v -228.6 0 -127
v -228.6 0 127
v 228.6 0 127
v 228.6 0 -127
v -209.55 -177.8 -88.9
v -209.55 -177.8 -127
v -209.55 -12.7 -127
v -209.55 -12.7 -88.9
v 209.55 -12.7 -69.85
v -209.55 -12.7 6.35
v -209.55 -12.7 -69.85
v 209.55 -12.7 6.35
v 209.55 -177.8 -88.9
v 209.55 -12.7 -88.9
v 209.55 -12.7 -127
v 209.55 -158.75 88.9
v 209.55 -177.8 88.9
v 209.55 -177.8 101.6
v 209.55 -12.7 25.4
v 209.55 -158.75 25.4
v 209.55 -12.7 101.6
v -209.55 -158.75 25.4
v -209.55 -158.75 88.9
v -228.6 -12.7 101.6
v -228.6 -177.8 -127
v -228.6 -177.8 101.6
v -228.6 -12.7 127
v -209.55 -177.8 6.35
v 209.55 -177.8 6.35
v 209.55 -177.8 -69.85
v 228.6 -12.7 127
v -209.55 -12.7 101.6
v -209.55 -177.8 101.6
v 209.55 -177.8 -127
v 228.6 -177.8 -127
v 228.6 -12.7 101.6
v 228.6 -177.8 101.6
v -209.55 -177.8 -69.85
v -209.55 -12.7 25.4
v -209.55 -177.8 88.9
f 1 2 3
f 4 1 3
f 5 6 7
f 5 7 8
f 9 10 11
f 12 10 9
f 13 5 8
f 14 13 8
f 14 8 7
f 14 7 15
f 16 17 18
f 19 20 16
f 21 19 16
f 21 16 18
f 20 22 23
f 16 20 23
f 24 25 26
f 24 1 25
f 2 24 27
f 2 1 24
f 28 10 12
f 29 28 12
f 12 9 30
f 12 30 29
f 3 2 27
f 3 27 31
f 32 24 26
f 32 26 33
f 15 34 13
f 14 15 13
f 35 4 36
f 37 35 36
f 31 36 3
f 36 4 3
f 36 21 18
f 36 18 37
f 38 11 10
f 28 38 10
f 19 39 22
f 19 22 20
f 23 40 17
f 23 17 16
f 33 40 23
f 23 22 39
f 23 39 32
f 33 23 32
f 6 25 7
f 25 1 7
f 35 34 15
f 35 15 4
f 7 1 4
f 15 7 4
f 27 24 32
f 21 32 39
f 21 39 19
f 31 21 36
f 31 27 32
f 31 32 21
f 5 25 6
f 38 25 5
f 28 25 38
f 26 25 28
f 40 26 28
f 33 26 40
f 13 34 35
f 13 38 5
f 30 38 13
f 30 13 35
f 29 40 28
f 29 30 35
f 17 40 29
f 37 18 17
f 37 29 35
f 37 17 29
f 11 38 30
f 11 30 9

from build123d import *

# Parameters (mm, degrees)
F0_W     = 457.2
F0_H     = 254
F1_DEPTH = 12.7
F2_W     = 19.05
F2_H     = 228.6
F3_DEPTH = 165.1
F4_W     = 19.05
F4_H     = 63.5
F5_DEPTH = 419.1
F6_W     = 419.1
F6_H     = 19.05
F7_DEPTH = 165.1
F8_W     = 165.1
F8_H     = 19.05
F9_DEPTH = 419.1


with BuildPart() as f1:
    # F0 (on Front) → F1 (new body)
    with BuildSketch(Plane.XZ):
        Rectangle(F0_W, F0_H)
    extrude(amount=F1_DEPTH)

    # F2 (on face) → F3 (join)
    with BuildSketch(Plane.XZ.offset(12.7)):
        with Locations((-219.075, -12.7)):
            Rectangle(F2_W, F2_H)
        with Locations((219.075, -12.7)):
            Rectangle(F2_W, F2_H)
    extrude(amount=F3_DEPTH)

    # F4 (on face) → F5 (join, through all)
    with BuildSketch(Plane.YZ.offset(-209.55)):
        with Locations((-168.275, 57.15)):
            Rectangle(F4_W, F4_H)
    extrude(amount=F5_DEPTH)

    # F6 (on face) → F7 (join, through all)
    with BuildSketch(Plane.XZ.offset(12.7)):
        with Locations((0, 15.875)):
            Rectangle(F6_W, F6_H)
    extrude(amount=F7_DEPTH)

    # F8 (on face) → F9 (join, through all)
    with BuildSketch(Plane.YZ.offset(-209.55)):
        with Locations((-95.25, -79.375)):
            Rectangle(F8_W, F8_H)
    extrude(amount=F9_DEPTH)


solid = f1.part
